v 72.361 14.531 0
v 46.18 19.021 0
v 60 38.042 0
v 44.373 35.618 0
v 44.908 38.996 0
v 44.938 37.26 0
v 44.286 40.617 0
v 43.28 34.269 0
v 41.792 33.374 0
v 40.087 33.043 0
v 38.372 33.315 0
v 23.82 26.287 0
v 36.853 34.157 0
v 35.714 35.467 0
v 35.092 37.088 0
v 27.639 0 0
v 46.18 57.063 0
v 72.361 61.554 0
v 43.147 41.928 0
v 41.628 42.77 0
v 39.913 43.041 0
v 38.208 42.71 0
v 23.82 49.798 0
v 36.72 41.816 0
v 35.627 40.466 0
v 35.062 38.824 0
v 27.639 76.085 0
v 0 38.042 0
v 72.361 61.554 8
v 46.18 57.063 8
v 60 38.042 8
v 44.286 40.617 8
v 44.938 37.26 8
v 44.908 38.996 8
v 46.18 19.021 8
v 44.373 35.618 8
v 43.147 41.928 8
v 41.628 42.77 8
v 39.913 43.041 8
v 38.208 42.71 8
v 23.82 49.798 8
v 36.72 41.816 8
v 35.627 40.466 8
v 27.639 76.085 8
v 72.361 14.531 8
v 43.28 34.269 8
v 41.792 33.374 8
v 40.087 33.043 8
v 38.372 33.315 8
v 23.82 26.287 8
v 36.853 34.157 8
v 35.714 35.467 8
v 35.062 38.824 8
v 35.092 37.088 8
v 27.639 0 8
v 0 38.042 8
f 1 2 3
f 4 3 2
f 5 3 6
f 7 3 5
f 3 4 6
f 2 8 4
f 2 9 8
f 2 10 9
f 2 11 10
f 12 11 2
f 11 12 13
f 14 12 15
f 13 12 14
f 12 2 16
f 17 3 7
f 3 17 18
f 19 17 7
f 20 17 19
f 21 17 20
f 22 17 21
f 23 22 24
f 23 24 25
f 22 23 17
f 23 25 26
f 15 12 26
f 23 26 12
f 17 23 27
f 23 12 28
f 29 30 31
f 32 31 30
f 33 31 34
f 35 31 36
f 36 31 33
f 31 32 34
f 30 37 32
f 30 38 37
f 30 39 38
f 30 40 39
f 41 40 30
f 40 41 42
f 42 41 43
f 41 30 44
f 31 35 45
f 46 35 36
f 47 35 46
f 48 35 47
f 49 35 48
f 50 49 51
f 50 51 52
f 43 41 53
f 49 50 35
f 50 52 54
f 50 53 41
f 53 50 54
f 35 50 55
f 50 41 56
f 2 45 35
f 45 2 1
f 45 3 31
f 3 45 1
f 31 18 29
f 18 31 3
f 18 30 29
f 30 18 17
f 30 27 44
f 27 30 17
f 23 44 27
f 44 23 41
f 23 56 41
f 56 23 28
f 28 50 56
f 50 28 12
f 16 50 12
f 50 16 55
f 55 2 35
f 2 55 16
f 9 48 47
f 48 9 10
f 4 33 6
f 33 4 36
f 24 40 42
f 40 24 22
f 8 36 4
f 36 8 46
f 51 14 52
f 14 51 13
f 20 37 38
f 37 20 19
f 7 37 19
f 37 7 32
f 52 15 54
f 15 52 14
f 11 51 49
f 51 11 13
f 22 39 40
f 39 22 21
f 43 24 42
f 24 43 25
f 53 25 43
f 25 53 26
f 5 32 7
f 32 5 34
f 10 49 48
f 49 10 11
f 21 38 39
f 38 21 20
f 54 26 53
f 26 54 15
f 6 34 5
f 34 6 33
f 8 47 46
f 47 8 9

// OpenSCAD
$fn = 32;

// ----------------------------------------------------------------------
// Star wheel: 5-point star, R40
// ----------------------------------------------------------------------

// --- parameters (mm) ---
n_points = 5;             // number of points / teeth
r_out = 40;               // tip radius
r_in = 20;                // root radius
bore_r = 5;               // centre bore radius
plate_t = 8;              // plate thickness, Z (extrusion height)
bore_d = 10;              // centre bore diameter

profile = [[0, 38.042], [23.82, 26.287], [27.639, 0], [46.18, 19.021], [72.361, 14.531], [60, 38.042], [72.361, 61.554], [46.18, 57.063], [27.639, 76.085], [23.82, 49.798]];  // primary outline, 10 points, counter clockwise
void_1 = [[44.908, 38.996], [44.286, 40.617], [43.147, 41.928], [41.628, 42.77], [39.913, 43.041], [38.208, 42.71], [36.72, 41.816], [35.627, 40.466], [35.062, 38.824], [35.092, 37.088], [35.714, 35.467], [36.853, 34.157], [38.372, 33.315], [40.087, 33.043], [41.792, 33.374], [43.28, 34.269], [44.373, 35.618], [44.938, 37.26]];  // centre bore, 18 points

// --- the one profile operation ---
difference() {
  linear_extrude(height = plate_t) polygon(points = profile);
  translate([0, 0, -1])
    linear_extrude(height = plate_t + 2) polygon(points = void_1);
}
